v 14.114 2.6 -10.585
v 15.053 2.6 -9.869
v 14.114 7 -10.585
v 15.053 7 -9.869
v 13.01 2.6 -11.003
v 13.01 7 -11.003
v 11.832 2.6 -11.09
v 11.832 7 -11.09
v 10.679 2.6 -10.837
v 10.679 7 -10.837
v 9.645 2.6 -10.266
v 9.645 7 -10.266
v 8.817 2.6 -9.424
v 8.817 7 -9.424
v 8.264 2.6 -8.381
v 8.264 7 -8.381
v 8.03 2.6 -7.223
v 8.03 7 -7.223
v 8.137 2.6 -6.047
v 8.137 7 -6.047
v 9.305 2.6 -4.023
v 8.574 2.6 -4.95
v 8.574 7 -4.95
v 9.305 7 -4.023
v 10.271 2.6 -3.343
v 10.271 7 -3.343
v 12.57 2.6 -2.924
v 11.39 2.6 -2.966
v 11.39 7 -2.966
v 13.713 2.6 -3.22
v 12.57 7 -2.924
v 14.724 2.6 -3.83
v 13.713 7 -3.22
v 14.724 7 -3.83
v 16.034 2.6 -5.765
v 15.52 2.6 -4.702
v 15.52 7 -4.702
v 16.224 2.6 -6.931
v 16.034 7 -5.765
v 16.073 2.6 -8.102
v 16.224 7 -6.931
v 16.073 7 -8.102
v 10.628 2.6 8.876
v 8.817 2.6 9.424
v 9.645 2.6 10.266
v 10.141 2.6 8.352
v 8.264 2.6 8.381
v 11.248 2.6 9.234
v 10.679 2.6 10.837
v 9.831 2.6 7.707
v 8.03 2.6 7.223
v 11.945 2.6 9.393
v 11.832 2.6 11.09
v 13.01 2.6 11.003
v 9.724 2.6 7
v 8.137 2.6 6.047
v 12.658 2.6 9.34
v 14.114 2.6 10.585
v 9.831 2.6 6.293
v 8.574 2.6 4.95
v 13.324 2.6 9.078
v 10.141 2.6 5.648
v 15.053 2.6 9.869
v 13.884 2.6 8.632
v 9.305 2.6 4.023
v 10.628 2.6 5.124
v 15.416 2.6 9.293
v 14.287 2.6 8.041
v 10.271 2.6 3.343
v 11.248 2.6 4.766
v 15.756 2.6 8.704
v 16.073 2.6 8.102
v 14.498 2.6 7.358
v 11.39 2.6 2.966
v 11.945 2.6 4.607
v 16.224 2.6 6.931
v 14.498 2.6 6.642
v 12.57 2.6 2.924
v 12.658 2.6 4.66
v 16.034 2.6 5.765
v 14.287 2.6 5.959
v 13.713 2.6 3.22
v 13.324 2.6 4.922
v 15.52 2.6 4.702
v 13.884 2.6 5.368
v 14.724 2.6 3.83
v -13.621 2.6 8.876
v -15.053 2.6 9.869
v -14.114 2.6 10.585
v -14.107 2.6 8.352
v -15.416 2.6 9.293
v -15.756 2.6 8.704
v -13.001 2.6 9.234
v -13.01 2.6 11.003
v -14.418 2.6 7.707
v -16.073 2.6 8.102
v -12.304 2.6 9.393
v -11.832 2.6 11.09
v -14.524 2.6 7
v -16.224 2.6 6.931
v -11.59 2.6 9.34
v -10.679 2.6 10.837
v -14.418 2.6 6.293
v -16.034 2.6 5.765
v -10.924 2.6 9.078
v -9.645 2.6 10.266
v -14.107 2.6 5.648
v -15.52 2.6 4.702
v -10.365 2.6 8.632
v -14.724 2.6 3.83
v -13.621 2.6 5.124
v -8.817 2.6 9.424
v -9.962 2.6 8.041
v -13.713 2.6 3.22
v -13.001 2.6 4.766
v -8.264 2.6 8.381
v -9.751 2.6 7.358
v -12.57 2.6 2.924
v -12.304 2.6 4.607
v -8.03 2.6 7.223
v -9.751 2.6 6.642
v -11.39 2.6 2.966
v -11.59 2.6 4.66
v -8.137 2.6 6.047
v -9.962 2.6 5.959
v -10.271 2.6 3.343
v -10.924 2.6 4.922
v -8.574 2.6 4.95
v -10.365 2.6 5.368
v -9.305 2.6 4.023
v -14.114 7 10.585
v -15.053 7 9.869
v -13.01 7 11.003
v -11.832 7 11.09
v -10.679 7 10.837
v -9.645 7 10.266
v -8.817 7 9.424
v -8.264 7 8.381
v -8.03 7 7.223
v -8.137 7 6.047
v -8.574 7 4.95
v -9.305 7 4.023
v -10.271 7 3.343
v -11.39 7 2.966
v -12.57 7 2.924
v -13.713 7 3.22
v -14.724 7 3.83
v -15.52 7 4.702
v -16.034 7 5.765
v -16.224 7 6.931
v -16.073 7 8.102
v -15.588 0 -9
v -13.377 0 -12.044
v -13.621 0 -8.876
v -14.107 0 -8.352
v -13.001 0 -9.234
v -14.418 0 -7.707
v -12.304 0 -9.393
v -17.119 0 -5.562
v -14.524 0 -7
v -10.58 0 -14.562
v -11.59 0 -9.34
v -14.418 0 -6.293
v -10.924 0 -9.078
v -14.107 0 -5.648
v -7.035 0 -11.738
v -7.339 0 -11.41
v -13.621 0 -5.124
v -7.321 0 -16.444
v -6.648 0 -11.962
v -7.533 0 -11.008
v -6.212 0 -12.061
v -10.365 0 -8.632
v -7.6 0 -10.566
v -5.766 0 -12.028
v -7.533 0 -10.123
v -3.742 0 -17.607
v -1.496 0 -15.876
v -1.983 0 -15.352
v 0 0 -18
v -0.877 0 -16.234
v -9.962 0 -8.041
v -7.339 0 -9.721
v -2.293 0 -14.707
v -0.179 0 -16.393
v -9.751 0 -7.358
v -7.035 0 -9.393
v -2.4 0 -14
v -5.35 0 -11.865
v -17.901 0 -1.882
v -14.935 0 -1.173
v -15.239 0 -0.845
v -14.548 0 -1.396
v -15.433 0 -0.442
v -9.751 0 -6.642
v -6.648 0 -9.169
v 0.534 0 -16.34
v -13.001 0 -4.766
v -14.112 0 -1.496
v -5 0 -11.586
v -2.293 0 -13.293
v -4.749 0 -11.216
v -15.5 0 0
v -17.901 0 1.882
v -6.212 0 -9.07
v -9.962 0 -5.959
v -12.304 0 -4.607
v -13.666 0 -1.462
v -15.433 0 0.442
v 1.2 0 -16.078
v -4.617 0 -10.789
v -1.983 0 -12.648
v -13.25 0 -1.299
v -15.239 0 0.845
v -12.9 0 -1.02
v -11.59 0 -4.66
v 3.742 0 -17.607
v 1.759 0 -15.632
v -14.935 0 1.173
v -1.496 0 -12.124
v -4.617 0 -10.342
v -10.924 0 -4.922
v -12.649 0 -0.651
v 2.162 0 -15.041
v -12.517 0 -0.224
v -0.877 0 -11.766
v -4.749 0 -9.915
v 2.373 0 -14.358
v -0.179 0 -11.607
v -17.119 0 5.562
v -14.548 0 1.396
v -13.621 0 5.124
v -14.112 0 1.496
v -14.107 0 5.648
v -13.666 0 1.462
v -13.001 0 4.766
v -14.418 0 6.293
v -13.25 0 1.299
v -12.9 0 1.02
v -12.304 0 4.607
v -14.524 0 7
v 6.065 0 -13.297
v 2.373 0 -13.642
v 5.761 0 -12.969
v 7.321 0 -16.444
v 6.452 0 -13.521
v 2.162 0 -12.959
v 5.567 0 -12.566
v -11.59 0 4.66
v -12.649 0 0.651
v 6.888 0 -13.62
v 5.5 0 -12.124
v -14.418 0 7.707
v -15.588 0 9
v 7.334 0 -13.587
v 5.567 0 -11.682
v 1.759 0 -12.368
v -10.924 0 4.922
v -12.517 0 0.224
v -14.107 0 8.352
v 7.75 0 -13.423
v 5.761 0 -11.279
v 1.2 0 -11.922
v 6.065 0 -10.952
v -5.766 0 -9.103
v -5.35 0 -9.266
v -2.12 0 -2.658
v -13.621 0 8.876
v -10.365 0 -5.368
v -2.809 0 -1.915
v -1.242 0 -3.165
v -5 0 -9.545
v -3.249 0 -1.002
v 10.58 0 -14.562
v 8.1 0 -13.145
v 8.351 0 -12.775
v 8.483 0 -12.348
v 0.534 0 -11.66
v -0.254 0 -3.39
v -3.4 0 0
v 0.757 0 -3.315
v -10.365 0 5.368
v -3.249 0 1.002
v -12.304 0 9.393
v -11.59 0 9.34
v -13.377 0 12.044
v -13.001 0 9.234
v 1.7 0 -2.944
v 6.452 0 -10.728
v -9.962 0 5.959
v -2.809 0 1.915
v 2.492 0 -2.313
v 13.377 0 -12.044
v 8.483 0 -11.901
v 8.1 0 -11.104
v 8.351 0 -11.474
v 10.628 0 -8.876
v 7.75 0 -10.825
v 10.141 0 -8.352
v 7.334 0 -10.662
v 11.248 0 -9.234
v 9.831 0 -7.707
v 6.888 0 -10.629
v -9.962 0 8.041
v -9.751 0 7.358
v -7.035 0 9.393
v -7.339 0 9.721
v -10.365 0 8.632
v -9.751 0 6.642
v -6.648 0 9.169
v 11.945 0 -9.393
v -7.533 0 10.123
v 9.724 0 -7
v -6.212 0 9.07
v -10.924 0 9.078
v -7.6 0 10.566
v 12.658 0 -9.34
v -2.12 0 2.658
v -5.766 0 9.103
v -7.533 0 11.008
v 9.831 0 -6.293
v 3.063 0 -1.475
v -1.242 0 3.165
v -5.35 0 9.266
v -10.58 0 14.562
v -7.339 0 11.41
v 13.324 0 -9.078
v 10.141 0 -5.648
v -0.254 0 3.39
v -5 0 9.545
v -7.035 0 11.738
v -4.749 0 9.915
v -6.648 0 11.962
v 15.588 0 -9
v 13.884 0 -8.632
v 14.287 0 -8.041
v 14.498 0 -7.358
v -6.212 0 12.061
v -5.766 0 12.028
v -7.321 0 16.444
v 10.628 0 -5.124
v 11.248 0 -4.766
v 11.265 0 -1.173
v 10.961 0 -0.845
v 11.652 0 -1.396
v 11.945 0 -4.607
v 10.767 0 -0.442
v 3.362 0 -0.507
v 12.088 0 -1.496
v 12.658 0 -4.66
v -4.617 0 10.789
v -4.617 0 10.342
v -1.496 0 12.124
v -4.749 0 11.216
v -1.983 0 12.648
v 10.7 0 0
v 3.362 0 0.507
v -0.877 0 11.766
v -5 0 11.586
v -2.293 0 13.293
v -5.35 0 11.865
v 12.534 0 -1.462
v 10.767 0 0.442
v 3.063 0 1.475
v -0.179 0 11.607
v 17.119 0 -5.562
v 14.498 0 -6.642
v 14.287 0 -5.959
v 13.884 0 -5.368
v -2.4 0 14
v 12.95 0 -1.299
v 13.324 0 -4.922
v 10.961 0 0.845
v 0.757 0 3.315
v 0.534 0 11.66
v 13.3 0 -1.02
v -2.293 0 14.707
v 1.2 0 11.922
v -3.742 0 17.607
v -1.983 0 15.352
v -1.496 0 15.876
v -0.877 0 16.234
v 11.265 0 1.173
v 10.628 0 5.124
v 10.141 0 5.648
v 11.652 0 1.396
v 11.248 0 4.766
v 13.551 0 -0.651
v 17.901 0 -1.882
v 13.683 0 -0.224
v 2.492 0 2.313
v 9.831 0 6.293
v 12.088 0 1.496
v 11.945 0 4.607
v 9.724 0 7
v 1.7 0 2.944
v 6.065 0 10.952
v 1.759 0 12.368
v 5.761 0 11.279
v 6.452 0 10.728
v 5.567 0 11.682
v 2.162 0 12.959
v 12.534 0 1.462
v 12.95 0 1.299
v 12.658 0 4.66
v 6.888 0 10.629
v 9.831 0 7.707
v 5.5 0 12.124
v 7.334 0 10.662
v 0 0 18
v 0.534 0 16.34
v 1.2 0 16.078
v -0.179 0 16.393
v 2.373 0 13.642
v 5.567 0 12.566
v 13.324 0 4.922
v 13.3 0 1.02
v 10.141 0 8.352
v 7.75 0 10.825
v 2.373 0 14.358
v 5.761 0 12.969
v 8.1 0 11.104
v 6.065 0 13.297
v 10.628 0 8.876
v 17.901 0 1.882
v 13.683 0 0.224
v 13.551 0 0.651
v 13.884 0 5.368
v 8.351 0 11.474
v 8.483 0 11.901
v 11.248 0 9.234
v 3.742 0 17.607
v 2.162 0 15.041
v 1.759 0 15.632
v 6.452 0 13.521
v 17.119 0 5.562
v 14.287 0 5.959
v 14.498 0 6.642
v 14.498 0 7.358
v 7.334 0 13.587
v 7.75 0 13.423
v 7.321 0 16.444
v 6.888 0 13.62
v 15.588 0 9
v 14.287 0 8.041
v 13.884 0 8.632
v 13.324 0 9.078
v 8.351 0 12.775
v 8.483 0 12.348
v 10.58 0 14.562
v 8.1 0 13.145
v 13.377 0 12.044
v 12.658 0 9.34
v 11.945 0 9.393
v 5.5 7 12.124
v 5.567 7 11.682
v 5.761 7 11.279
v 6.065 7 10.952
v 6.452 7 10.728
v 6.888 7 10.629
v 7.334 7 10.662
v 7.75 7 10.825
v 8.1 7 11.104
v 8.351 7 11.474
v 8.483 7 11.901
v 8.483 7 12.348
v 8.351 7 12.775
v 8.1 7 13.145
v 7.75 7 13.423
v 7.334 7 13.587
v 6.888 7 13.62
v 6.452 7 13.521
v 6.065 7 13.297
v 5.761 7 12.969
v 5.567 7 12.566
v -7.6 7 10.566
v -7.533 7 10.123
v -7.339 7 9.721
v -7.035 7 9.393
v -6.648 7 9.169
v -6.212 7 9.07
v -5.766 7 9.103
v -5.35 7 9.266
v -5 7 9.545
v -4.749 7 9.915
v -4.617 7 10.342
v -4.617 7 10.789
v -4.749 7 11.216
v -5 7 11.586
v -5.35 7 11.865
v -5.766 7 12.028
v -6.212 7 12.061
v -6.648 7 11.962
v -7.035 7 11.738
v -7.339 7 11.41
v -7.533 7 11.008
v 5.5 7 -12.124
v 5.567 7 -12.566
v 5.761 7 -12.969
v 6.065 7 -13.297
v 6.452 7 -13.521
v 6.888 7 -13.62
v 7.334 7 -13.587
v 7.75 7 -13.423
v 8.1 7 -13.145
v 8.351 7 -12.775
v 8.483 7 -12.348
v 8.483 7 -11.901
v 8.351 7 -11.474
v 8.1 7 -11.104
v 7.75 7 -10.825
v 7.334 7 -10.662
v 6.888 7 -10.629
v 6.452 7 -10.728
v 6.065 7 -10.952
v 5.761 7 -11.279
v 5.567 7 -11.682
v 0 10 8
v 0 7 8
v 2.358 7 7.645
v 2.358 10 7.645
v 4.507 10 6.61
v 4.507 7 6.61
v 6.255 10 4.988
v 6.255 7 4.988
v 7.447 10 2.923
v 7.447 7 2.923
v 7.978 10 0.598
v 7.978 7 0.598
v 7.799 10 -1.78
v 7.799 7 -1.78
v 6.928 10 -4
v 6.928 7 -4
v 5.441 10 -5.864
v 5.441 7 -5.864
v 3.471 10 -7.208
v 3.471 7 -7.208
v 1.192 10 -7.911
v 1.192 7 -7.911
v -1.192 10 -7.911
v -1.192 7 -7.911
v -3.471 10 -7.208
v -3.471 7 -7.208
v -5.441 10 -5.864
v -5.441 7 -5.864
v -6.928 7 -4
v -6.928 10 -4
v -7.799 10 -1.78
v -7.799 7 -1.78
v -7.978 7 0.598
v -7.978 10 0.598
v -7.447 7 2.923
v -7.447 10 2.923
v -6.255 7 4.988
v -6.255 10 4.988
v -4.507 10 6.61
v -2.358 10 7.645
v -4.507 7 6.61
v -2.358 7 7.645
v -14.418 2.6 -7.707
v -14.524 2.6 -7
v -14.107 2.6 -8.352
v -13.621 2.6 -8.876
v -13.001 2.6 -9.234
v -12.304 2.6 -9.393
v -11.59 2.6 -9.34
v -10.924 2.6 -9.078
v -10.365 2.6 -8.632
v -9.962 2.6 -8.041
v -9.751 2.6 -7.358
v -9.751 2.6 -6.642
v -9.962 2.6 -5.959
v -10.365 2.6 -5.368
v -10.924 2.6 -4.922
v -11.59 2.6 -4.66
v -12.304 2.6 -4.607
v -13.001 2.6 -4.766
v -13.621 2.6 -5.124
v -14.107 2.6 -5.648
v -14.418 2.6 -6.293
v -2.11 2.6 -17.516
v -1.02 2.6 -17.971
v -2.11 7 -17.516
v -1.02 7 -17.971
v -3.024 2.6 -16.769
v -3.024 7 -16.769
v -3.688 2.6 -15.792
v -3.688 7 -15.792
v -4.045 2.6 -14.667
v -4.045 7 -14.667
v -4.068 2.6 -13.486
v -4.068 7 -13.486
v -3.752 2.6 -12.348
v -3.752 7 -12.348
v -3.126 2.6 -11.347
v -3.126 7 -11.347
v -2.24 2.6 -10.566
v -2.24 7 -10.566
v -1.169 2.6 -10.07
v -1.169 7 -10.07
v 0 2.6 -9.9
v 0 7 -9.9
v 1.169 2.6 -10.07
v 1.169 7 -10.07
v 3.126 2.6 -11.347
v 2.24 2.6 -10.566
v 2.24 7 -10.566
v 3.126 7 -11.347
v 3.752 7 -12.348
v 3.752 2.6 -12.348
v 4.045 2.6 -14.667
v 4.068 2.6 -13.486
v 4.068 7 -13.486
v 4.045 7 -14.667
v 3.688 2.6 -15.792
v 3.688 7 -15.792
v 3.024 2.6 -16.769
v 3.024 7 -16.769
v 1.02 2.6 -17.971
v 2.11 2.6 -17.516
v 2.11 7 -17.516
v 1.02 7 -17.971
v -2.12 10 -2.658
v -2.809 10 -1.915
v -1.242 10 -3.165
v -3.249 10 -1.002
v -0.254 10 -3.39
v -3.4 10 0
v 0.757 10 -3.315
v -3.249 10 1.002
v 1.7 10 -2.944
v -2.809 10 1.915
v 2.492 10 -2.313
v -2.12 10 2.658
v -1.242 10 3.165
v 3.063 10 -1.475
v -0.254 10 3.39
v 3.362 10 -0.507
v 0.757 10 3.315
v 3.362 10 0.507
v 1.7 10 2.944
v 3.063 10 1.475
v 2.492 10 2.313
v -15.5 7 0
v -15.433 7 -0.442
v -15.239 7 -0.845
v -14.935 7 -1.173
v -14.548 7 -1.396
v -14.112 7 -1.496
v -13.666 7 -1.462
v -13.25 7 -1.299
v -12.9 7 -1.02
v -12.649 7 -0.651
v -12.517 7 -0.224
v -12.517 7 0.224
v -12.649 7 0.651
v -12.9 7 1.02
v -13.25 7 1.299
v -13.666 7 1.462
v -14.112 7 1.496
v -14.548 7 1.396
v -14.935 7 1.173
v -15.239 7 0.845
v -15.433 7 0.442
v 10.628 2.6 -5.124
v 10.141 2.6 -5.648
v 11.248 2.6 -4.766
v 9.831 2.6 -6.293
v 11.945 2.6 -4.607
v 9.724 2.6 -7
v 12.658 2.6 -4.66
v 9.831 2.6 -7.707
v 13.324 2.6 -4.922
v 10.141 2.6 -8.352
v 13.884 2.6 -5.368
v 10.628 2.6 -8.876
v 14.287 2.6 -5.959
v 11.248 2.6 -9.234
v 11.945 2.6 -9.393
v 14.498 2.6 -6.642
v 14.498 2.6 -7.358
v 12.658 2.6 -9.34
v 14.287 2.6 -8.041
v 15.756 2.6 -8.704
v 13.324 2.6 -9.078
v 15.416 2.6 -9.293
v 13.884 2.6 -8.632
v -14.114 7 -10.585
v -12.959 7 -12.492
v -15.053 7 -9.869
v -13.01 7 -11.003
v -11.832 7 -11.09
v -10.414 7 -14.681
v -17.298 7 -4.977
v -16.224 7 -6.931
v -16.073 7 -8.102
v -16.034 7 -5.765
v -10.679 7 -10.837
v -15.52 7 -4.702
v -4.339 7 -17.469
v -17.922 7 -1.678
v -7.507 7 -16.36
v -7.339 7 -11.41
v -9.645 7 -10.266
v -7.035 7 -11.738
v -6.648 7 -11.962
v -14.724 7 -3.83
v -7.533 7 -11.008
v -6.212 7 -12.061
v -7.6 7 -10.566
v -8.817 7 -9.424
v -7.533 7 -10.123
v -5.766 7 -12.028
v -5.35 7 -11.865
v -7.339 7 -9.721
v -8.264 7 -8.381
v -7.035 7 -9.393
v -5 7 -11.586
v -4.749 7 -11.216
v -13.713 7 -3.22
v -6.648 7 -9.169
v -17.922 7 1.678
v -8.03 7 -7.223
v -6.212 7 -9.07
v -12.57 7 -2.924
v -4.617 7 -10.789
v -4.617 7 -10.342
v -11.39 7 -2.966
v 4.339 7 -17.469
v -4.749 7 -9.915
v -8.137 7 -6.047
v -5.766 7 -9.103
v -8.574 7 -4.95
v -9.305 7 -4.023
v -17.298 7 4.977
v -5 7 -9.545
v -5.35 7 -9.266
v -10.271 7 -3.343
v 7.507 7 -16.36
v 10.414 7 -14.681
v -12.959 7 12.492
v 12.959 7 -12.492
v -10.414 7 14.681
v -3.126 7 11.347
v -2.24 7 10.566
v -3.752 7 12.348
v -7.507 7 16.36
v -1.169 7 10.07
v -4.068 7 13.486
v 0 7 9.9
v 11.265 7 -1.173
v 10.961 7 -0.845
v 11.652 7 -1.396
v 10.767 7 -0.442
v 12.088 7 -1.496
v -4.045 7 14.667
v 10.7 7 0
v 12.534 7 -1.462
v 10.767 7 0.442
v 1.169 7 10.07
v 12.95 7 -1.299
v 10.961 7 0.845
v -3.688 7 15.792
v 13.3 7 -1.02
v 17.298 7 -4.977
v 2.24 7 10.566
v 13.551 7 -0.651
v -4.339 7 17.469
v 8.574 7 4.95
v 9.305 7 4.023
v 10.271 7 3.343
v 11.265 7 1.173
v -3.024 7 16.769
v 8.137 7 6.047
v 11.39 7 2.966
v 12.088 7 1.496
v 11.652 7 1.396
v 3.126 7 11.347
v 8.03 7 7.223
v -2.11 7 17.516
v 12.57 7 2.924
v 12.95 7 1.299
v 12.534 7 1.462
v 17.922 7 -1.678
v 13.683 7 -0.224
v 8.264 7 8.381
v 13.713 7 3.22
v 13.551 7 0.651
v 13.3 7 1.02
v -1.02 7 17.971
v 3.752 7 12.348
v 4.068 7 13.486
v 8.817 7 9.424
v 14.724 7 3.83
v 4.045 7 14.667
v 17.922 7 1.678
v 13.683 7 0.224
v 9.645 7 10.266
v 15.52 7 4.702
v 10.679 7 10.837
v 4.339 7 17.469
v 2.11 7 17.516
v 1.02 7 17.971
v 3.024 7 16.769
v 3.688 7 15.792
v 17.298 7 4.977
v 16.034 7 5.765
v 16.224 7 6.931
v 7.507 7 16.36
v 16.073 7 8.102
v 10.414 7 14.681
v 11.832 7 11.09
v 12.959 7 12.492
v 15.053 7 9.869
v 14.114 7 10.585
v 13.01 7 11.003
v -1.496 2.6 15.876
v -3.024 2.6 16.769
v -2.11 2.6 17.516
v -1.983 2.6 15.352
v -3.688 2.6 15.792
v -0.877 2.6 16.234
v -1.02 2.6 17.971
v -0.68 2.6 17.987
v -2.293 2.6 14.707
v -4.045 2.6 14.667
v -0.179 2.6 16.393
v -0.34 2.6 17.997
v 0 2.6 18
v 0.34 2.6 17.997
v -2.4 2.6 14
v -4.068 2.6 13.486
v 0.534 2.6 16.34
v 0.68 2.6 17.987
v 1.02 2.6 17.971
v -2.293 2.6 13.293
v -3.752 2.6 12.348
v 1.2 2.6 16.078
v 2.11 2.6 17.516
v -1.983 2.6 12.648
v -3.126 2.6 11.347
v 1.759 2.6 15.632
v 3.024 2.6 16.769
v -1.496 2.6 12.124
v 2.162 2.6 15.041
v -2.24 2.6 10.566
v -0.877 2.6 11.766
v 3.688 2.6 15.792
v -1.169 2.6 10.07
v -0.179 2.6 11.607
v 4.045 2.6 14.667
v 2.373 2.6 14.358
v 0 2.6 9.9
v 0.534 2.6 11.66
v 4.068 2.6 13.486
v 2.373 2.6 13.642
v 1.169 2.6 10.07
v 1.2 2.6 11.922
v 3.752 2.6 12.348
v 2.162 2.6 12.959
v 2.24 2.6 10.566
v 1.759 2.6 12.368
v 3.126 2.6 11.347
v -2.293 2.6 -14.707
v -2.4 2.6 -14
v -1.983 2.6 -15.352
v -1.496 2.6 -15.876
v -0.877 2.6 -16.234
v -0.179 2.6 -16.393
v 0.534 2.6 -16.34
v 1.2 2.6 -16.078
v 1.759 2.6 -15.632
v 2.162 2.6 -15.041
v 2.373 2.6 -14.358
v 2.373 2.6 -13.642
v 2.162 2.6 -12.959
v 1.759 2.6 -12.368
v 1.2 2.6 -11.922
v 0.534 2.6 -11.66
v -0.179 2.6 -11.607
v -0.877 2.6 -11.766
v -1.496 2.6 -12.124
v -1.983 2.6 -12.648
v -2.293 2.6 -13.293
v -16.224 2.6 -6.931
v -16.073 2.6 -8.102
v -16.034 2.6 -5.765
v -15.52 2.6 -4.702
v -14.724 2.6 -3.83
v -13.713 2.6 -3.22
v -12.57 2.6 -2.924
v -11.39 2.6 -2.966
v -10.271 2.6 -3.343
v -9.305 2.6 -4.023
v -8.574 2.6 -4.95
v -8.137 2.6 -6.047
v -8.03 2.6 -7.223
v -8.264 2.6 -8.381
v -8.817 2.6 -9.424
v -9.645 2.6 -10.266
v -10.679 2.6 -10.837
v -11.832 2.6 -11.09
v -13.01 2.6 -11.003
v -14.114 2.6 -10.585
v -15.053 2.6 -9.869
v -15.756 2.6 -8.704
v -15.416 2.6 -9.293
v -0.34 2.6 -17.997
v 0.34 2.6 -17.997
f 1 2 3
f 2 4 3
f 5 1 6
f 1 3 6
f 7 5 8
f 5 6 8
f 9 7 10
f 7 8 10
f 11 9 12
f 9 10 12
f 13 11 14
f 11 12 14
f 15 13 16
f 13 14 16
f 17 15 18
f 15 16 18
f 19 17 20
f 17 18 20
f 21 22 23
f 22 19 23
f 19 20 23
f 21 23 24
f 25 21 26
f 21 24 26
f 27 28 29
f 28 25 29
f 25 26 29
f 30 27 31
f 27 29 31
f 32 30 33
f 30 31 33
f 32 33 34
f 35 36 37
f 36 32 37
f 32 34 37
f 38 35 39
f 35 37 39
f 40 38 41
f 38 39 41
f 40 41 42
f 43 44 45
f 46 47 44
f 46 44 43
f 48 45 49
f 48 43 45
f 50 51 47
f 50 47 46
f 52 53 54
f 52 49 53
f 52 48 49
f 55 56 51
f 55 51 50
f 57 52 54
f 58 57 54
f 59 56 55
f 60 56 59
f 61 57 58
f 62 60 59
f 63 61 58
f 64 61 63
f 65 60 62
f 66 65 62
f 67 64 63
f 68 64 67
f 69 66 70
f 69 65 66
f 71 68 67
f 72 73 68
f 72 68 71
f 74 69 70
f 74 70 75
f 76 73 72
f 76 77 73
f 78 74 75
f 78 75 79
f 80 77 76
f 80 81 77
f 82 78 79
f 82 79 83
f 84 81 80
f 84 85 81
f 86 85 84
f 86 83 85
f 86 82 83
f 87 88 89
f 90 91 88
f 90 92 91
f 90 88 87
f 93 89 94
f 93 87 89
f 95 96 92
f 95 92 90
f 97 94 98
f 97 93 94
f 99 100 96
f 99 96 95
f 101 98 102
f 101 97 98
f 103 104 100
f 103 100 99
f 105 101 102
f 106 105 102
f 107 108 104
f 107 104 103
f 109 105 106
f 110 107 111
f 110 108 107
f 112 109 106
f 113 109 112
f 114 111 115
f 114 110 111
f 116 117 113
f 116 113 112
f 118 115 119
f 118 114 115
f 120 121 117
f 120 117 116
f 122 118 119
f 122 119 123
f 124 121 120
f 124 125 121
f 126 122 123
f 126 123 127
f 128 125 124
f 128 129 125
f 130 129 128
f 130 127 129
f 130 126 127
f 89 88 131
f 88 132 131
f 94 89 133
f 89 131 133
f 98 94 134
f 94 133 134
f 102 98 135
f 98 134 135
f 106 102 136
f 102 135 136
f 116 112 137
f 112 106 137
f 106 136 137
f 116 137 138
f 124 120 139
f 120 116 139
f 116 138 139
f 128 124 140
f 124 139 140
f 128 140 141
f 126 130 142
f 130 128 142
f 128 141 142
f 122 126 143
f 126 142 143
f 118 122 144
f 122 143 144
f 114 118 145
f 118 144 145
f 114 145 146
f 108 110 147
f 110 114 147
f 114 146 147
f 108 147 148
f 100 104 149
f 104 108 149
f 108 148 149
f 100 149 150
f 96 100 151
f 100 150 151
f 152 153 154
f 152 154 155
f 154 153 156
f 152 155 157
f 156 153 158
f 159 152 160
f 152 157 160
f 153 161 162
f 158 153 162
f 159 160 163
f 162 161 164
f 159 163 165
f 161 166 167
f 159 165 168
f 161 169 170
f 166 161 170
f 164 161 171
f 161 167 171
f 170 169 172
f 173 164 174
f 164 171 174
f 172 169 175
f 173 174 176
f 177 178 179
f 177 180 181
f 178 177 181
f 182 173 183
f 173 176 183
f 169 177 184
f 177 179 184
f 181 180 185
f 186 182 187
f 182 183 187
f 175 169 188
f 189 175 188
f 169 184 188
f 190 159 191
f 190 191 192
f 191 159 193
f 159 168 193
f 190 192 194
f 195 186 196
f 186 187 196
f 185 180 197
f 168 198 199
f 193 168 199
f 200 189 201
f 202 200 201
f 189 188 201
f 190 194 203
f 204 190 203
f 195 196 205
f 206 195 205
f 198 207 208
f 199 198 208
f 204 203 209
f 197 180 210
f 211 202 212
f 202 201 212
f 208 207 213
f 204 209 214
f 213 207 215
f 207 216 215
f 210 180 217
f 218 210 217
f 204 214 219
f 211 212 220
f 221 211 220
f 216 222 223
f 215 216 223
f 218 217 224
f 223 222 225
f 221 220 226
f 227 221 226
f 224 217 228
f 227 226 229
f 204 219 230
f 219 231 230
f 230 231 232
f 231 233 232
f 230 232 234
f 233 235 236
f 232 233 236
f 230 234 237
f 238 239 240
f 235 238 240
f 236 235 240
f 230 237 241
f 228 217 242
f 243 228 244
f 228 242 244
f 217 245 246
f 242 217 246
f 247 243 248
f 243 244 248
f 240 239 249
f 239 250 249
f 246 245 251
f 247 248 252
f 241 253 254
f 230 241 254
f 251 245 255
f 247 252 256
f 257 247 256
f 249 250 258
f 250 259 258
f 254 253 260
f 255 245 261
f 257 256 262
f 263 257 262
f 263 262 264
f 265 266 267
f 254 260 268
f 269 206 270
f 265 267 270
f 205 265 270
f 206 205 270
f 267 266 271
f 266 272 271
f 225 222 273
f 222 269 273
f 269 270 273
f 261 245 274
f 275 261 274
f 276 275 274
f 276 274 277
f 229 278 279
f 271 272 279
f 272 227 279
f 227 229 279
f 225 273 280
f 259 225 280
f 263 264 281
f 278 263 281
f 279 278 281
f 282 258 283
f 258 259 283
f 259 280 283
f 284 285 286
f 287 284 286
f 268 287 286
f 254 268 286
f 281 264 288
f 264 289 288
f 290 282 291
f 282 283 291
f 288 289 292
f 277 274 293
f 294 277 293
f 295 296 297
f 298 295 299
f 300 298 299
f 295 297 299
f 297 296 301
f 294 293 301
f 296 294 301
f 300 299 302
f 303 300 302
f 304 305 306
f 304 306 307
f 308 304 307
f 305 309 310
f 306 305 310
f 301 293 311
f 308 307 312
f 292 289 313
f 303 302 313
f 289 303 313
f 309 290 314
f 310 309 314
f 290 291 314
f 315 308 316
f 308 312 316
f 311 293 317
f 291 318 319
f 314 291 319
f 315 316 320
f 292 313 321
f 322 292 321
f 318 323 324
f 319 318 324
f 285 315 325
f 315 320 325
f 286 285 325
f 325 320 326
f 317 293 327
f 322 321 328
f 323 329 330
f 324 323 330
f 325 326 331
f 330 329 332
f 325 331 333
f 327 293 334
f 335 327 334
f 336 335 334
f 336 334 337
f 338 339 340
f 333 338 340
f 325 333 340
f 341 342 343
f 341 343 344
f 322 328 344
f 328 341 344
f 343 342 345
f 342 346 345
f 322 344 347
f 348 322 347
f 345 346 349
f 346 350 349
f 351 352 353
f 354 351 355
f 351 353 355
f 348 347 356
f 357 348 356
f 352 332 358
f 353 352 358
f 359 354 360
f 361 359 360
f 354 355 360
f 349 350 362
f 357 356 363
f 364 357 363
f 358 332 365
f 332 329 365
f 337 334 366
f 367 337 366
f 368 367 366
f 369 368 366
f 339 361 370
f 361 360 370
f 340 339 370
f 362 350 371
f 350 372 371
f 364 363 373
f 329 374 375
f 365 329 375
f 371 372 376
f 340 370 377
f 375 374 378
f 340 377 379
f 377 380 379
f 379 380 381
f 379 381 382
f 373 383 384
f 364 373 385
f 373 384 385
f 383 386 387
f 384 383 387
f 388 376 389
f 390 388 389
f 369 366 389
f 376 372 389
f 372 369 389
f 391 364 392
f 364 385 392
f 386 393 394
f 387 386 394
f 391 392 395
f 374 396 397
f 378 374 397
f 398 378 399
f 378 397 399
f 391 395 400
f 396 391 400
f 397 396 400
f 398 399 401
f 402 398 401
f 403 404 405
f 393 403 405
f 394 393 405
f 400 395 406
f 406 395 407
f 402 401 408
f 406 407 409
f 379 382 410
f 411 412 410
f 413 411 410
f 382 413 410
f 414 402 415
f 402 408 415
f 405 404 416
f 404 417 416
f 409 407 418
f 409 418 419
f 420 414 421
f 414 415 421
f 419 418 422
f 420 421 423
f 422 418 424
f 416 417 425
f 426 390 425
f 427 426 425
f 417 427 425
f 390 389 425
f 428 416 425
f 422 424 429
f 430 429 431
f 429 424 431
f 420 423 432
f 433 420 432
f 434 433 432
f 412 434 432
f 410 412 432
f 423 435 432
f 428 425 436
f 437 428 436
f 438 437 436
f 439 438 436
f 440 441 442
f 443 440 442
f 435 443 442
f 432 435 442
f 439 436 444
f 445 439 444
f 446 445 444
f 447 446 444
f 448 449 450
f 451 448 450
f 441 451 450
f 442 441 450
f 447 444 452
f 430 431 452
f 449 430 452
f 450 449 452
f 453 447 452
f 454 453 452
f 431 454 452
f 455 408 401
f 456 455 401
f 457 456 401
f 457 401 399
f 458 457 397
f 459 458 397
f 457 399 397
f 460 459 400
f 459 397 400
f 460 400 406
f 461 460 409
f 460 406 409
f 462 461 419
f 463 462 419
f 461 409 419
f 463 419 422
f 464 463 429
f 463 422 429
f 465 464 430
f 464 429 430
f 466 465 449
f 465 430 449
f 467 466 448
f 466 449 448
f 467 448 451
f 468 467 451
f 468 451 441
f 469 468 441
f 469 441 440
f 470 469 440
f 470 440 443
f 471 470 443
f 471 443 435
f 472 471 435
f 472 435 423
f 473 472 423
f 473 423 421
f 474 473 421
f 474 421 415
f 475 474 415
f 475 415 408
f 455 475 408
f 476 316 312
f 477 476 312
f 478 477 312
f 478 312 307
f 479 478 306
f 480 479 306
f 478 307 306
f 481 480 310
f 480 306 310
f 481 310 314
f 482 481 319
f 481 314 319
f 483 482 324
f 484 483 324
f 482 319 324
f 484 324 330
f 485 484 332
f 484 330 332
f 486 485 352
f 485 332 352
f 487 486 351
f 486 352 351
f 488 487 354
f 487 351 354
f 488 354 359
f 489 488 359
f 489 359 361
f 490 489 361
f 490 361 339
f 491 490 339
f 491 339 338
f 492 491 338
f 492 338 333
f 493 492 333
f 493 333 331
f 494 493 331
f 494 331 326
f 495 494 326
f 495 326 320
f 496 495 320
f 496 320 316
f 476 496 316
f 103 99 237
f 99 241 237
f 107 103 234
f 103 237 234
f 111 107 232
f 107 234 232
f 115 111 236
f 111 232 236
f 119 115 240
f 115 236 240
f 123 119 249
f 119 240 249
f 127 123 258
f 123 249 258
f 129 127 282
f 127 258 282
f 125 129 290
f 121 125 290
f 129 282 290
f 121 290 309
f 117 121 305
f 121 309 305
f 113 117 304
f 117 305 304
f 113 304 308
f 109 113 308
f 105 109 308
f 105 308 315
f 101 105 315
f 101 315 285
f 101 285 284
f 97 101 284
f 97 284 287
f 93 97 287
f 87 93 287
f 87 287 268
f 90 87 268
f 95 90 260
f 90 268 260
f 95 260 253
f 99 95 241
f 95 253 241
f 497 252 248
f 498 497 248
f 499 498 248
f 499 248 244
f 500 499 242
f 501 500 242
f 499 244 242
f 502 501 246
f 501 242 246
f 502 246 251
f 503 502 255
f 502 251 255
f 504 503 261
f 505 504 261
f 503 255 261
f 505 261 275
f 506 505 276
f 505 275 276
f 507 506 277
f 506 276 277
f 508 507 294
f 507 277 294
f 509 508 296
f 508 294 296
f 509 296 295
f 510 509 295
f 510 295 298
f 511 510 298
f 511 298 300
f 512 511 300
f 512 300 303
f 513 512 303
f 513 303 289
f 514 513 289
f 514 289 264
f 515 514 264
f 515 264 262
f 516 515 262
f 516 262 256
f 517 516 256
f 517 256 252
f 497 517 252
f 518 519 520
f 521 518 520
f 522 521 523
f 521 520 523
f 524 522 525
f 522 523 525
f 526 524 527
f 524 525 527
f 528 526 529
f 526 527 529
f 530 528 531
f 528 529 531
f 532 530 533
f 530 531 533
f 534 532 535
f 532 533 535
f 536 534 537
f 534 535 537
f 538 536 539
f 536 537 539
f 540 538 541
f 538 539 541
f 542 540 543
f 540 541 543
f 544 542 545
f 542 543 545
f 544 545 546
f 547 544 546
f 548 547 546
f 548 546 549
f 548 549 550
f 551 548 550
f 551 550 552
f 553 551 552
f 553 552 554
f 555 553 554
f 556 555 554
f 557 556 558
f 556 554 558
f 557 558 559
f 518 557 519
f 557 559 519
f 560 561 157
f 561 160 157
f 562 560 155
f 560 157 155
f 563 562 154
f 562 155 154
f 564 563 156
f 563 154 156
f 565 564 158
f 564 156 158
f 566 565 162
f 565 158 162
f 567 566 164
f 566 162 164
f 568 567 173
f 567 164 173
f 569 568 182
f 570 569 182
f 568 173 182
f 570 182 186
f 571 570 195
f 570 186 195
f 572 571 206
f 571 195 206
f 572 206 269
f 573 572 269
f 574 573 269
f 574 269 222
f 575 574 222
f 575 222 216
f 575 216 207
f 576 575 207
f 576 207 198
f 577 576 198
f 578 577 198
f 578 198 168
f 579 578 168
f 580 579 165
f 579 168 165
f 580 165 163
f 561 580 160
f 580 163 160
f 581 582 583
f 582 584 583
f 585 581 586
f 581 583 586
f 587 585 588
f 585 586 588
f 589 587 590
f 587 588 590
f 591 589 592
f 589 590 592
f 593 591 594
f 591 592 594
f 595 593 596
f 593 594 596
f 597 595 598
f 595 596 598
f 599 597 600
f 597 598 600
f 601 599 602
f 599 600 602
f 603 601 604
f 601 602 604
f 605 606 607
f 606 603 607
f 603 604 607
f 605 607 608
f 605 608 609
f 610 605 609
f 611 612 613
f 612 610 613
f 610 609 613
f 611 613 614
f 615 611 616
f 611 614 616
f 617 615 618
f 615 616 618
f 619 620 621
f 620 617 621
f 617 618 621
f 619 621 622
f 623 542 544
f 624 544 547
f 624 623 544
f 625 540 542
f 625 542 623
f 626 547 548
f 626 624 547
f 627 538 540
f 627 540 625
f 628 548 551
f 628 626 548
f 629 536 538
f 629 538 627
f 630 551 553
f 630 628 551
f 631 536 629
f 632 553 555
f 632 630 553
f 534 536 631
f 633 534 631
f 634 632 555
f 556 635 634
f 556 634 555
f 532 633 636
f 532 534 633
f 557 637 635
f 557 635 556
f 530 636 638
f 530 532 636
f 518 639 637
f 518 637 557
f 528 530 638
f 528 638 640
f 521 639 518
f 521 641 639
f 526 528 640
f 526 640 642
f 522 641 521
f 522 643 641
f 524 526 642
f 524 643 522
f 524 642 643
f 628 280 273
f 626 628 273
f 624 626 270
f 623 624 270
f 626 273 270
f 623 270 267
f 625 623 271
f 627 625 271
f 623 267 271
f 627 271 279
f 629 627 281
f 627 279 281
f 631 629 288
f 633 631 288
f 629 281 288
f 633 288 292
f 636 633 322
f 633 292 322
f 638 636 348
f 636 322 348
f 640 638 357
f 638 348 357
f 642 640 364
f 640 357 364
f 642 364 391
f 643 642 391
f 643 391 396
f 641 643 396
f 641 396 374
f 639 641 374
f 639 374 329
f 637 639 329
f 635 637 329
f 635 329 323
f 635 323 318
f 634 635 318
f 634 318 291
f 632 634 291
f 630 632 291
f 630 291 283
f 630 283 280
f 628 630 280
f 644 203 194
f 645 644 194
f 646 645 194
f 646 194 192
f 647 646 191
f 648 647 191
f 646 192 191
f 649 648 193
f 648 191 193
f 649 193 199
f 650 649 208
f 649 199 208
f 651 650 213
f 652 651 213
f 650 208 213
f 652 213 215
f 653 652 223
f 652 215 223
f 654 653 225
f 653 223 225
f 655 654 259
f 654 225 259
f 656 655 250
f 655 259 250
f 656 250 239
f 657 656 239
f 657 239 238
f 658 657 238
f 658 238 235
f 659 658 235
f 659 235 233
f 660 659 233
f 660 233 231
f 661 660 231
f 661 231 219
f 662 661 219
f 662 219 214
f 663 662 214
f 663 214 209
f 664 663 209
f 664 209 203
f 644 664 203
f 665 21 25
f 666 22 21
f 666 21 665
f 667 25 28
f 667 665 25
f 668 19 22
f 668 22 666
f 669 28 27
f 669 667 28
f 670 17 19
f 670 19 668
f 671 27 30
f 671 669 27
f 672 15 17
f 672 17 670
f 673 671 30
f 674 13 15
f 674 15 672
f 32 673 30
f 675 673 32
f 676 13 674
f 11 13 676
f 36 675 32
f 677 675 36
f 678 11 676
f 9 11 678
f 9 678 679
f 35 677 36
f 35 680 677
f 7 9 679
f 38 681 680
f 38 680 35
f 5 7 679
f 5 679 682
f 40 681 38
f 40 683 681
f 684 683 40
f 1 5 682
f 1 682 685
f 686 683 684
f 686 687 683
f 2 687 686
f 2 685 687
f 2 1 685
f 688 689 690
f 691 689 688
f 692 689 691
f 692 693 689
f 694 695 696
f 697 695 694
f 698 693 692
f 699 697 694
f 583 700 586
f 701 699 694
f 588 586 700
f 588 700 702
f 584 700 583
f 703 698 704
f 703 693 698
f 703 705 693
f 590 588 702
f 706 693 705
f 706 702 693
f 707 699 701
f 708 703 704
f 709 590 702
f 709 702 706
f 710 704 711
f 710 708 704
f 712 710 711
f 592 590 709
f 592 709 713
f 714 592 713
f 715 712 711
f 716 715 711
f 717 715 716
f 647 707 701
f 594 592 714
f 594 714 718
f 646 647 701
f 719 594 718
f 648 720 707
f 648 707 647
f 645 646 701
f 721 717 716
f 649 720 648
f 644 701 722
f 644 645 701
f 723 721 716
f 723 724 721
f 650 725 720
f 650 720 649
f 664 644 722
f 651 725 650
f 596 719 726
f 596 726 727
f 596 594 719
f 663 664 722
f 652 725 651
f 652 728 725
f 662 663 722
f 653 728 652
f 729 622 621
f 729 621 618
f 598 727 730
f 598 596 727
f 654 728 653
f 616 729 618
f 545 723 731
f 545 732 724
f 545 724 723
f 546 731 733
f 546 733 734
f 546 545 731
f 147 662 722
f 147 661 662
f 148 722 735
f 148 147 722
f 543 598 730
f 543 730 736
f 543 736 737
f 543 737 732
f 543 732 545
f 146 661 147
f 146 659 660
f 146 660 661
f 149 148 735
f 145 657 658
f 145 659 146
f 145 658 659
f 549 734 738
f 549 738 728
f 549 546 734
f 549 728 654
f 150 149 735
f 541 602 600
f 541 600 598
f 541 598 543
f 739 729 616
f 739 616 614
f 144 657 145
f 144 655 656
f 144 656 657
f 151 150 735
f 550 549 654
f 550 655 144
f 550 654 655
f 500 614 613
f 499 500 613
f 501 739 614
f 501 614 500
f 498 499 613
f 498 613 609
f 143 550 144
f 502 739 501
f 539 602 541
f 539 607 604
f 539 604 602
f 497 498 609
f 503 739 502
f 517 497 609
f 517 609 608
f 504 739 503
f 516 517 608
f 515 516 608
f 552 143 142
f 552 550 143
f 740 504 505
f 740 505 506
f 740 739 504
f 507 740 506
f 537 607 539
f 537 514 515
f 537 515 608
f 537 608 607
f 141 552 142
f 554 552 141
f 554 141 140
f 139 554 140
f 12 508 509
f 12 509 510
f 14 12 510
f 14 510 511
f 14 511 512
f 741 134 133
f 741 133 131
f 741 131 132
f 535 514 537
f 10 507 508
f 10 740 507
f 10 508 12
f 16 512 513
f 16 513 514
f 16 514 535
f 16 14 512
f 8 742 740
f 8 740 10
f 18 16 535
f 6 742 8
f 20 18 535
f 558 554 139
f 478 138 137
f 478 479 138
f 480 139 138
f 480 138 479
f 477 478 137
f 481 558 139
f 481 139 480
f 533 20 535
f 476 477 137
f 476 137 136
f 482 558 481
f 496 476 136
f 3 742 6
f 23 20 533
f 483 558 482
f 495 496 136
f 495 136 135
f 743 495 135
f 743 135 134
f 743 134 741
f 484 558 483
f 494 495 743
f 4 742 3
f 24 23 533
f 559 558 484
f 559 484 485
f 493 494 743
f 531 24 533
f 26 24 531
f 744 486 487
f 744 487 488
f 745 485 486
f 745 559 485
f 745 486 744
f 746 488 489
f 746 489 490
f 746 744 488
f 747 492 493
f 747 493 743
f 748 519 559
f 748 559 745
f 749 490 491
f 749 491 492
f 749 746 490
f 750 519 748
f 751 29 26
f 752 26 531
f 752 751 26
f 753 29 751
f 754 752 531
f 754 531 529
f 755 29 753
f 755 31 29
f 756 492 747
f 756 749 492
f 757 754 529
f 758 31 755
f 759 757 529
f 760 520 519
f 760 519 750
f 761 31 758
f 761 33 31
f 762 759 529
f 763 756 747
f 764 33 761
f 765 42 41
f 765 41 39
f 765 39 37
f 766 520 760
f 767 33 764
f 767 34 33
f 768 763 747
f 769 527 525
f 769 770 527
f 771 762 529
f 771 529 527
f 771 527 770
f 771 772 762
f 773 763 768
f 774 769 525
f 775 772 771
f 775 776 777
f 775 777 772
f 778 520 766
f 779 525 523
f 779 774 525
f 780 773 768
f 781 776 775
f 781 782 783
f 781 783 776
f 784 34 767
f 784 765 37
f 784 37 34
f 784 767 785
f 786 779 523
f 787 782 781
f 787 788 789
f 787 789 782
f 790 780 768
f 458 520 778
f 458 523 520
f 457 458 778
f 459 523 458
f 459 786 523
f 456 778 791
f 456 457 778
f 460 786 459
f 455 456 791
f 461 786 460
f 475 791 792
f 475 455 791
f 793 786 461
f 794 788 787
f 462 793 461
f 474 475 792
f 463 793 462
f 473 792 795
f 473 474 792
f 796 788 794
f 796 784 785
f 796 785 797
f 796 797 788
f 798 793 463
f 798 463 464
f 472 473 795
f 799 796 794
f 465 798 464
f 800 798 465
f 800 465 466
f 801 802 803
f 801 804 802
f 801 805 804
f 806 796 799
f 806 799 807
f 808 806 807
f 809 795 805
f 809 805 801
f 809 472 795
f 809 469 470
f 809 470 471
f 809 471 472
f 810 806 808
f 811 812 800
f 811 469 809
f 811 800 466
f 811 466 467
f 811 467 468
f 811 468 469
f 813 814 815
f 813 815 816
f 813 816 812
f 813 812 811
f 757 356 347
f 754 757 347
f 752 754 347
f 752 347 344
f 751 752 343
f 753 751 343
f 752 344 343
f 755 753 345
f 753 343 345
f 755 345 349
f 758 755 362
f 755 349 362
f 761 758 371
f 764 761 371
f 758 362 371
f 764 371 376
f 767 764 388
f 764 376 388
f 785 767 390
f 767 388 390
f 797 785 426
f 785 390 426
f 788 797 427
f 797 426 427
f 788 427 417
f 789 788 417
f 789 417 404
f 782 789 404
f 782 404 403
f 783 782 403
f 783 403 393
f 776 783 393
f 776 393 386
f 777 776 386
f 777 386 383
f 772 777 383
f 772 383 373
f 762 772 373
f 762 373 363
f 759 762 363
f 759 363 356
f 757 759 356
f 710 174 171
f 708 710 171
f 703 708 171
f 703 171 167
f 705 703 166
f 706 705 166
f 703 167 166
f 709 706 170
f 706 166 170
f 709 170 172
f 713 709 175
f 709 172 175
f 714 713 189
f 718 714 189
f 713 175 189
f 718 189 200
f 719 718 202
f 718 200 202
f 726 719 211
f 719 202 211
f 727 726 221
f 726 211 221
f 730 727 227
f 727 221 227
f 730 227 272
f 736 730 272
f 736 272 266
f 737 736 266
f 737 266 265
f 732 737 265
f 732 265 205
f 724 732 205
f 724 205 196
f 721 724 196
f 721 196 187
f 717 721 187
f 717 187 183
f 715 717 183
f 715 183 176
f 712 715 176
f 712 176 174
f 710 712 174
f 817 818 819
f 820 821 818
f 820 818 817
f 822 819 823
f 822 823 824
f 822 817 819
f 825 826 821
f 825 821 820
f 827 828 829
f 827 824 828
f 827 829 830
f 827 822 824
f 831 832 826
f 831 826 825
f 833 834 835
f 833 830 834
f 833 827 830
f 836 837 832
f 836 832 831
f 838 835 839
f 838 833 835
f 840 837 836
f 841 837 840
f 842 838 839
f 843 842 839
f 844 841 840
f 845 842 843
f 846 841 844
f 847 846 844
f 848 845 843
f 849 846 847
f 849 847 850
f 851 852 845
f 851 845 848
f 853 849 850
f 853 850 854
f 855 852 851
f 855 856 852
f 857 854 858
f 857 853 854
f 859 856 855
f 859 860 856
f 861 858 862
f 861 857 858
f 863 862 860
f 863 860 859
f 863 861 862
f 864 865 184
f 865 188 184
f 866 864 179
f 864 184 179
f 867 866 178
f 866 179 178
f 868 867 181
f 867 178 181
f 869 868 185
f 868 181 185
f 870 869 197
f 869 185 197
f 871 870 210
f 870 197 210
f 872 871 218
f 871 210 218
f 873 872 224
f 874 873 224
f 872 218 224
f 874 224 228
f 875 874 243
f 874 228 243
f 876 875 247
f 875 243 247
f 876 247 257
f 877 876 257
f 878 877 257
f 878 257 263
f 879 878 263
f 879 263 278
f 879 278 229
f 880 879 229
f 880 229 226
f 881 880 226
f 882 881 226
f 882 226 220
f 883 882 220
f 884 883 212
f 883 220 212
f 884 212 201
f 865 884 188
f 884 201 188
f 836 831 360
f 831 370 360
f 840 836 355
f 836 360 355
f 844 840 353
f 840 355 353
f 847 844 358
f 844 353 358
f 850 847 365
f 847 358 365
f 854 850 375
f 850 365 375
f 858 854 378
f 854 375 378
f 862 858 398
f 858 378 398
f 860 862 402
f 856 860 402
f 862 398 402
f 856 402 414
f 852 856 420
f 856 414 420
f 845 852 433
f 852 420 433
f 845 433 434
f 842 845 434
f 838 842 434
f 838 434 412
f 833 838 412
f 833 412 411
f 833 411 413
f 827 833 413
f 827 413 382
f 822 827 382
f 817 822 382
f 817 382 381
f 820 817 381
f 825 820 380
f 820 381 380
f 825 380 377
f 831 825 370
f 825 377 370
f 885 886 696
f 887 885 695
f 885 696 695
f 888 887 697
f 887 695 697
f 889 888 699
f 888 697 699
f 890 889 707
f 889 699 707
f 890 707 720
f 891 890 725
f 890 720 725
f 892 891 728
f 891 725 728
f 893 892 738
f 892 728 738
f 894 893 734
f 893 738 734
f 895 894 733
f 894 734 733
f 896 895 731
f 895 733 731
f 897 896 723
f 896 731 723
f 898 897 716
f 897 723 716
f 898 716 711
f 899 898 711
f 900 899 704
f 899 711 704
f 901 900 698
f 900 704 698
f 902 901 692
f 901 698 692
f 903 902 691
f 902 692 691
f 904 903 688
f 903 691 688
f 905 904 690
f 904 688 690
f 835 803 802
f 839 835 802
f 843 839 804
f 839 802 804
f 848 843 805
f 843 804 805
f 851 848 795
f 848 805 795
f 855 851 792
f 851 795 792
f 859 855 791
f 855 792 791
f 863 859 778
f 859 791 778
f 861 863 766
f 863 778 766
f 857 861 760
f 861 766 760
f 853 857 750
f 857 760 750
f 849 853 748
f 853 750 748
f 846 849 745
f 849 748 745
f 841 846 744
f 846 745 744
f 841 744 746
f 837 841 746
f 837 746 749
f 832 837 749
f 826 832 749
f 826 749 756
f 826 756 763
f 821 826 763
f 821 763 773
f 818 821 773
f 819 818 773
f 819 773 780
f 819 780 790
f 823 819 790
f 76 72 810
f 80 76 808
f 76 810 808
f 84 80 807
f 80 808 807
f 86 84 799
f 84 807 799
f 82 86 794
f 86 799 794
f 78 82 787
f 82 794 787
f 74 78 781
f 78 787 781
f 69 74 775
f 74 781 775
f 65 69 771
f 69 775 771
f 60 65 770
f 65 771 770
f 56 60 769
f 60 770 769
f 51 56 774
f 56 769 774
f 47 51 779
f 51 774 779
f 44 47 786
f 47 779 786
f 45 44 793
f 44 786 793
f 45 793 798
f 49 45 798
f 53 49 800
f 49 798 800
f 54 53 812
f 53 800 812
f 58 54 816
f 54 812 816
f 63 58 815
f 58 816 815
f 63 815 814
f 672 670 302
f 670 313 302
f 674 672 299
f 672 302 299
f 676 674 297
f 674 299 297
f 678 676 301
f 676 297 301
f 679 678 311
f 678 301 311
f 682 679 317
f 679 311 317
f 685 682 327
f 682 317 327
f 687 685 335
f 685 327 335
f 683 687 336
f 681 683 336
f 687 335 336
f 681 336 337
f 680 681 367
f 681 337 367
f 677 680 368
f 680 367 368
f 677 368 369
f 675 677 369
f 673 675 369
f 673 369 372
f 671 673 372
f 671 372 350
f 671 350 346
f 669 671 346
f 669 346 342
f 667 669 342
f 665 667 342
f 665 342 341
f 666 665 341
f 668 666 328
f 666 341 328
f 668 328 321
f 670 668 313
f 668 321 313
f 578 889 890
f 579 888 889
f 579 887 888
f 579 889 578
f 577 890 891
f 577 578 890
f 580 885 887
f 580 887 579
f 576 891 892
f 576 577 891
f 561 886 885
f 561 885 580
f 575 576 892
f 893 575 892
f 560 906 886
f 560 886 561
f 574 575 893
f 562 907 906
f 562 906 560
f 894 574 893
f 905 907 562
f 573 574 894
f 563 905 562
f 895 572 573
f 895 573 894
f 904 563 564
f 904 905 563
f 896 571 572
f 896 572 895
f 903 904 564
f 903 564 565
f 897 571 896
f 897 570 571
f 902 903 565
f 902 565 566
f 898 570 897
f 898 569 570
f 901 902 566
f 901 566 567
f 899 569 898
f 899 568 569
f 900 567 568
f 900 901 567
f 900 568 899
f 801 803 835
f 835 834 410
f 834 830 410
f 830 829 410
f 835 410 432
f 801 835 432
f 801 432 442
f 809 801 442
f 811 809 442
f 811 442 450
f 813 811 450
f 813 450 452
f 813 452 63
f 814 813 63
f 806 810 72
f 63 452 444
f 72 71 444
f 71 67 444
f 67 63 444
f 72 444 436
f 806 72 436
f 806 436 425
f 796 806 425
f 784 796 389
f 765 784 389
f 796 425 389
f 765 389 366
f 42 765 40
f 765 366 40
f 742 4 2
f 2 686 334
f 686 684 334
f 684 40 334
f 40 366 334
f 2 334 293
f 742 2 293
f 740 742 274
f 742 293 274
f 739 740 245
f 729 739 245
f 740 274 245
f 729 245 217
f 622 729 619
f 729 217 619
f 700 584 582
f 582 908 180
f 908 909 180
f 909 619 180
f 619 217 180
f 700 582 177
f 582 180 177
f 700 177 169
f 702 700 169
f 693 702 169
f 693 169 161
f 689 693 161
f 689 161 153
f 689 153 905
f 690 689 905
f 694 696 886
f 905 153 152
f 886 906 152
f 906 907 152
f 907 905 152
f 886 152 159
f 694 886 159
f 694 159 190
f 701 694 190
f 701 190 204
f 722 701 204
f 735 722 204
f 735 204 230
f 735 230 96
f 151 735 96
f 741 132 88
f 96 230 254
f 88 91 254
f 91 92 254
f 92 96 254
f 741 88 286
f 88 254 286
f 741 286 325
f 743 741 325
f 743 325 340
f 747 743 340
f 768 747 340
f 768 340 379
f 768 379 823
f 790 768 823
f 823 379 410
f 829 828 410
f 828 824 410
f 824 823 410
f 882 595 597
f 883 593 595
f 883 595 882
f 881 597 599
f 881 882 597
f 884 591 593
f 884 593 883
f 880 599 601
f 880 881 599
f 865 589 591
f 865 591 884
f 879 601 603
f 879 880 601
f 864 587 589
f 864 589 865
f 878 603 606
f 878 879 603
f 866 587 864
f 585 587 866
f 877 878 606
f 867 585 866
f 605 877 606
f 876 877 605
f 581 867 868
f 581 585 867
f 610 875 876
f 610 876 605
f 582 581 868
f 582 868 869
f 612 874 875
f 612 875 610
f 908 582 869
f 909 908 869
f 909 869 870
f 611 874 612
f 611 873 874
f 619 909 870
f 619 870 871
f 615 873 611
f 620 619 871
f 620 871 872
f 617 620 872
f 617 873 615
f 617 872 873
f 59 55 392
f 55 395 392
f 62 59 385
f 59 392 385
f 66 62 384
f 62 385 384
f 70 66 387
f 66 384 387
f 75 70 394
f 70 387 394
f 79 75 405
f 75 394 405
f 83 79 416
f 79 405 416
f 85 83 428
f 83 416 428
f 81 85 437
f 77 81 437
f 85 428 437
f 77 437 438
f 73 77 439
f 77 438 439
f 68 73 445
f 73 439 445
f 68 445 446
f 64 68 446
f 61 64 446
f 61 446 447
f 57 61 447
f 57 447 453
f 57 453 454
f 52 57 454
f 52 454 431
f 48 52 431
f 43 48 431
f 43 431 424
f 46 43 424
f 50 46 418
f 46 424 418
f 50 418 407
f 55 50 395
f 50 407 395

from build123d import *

# Parameters (mm, degrees)
SKETCH1_R                                           = 18
BOSS_EXTRUDE1_DEPTH                                 = 7
CBORE_FOR_M4_HEX_SOCKET_HEAD_CAP_SCREW2_D           = 4.8
CBORE_FOR_M4_HEX_SOCKET_HEAD_CAP_SCREW2_DEPTH       = 10
CBORE_FOR_M4_HEX_SOCKET_HEAD_CAP_SCREW2_CBORE_D     = 8.2
CBORE_FOR_M4_HEX_SOCKET_HEAD_CAP_SCREW2_CBORE_DEPTH = 4.4
CBORE_FOR_M4_HEX_SOCKET_HEAD_CAP_SCREW2_TIP         = 1.442065486
F_3_0MM_DOWEL_HOLE1_D                               = 3
F_3_0MM_DOWEL_HOLE1_DEPTH                           = 10
F_3_0MM_DOWEL_HOLE1_TIP                             = 0.901290929
F_3_0MM_DOWEL_HOLE2_D                               = 3
F_3_0MM_DOWEL_HOLE2_DEPTH                           = 10
F_3_0MM_DOWEL_HOLE2_TIP                             = 0.901290929
SKETCH8_R                                           = 8
BOSS_EXTRUDE2_DEPTH                                 = 3
TAP_DRILL_FOR_M8_TAP1_D                             = 6.8


with BuildPart() as part:
    # Sketch1 → Boss-Extrude1 (new body)
    with BuildSketch(Plane(origin=(0, 0, 0), x_dir=(1, 0, 0), z_dir=(0, 1, 0))):
        with Locations(Location((0, 0, 0), (0, 0, 270))):
            Circle(SKETCH1_R)
    extrude(amount=BOSS_EXTRUDE1_DEPTH)

    # CBORE for M4 Hex Socket Head Cap Screw2
    with Locations(Plane(origin=(0, 7, 0), x_dir=(1, 0, 0), z_dir=(0, 1, 0))):
        with Locations((-12.124355653, 7), (0, 14), (12.124355653, 7), (12.124355653, -7), (0, -14), (-12.124355653, -7)):
            CounterBoreHole(CBORE_FOR_M4_HEX_SOCKET_HEAD_CAP_SCREW2_D / 2, CBORE_FOR_M4_HEX_SOCKET_HEAD_CAP_SCREW2_CBORE_D / 2, CBORE_FOR_M4_HEX_SOCKET_HEAD_CAP_SCREW2_CBORE_DEPTH, depth=CBORE_FOR_M4_HEX_SOCKET_HEAD_CAP_SCREW2_DEPTH)
            with Locations((0, 0, -(CBORE_FOR_M4_HEX_SOCKET_HEAD_CAP_SCREW2_DEPTH + CBORE_FOR_M4_HEX_SOCKET_HEAD_CAP_SCREW2_TIP / 2))):  # 118° drill point
                Cone(0, CBORE_FOR_M4_HEX_SOCKET_HEAD_CAP_SCREW2_D / 2, CBORE_FOR_M4_HEX_SOCKET_HEAD_CAP_SCREW2_TIP, mode=Mode.SUBTRACT)

    # Ø3.0mm Dowel Hole1
    with Locations(Plane(origin=(0, 7, 0), x_dir=(1, 0, 0), z_dir=(0, 1, 0))):
        with Locations((7, -12.124355653), (-14, 0), (7, 12.124355653)):
            Hole(F_3_0MM_DOWEL_HOLE1_D / 2, depth=F_3_0MM_DOWEL_HOLE1_DEPTH)
            with Locations((0, 0, -(F_3_0MM_DOWEL_HOLE1_DEPTH + F_3_0MM_DOWEL_HOLE1_TIP / 2))):  # 118° drill point
                Cone(0, F_3_0MM_DOWEL_HOLE1_D / 2, F_3_0MM_DOWEL_HOLE1_TIP, mode=Mode.SUBTRACT)

    # Ø3.0mm Dowel Hole2
    with Locations(Plane(origin=(0, 7, 0), x_dir=(1, 0, 0), z_dir=(0, 1, 0))):
        with Locations((-6.1, 10.565509926), (12.2, 0), (-6.1, -10.565509926)):
            Hole(F_3_0MM_DOWEL_HOLE2_D / 2, depth=F_3_0MM_DOWEL_HOLE2_DEPTH)
            with Locations((0, 0, -(F_3_0MM_DOWEL_HOLE2_DEPTH + F_3_0MM_DOWEL_HOLE2_TIP / 2))):  # 118° drill point
                Cone(0, F_3_0MM_DOWEL_HOLE2_D / 2, F_3_0MM_DOWEL_HOLE2_TIP, mode=Mode.SUBTRACT)

    # Sketch8 → Boss-Extrude2 (add)
    with BuildSketch(Plane(origin=(0, 7, 0), x_dir=(1, 0, 0), z_dir=(0, 1, 0))):
        with Locations(Location((0, 0, 0), (0, 0, 270))):
            Circle(SKETCH8_R)
    extrude(amount=BOSS_EXTRUDE2_DEPTH)

    # Tap Drill for M8 Tap1 (through all)
    with Locations(Plane(origin=(0, 10, 0), x_dir=(1, 0, 0), z_dir=(0, 1, 0))):
        with Locations((0, 0)):
            Hole(TAP_DRILL_FOR_M8_TAP1_D / 2)


solid = part.part
